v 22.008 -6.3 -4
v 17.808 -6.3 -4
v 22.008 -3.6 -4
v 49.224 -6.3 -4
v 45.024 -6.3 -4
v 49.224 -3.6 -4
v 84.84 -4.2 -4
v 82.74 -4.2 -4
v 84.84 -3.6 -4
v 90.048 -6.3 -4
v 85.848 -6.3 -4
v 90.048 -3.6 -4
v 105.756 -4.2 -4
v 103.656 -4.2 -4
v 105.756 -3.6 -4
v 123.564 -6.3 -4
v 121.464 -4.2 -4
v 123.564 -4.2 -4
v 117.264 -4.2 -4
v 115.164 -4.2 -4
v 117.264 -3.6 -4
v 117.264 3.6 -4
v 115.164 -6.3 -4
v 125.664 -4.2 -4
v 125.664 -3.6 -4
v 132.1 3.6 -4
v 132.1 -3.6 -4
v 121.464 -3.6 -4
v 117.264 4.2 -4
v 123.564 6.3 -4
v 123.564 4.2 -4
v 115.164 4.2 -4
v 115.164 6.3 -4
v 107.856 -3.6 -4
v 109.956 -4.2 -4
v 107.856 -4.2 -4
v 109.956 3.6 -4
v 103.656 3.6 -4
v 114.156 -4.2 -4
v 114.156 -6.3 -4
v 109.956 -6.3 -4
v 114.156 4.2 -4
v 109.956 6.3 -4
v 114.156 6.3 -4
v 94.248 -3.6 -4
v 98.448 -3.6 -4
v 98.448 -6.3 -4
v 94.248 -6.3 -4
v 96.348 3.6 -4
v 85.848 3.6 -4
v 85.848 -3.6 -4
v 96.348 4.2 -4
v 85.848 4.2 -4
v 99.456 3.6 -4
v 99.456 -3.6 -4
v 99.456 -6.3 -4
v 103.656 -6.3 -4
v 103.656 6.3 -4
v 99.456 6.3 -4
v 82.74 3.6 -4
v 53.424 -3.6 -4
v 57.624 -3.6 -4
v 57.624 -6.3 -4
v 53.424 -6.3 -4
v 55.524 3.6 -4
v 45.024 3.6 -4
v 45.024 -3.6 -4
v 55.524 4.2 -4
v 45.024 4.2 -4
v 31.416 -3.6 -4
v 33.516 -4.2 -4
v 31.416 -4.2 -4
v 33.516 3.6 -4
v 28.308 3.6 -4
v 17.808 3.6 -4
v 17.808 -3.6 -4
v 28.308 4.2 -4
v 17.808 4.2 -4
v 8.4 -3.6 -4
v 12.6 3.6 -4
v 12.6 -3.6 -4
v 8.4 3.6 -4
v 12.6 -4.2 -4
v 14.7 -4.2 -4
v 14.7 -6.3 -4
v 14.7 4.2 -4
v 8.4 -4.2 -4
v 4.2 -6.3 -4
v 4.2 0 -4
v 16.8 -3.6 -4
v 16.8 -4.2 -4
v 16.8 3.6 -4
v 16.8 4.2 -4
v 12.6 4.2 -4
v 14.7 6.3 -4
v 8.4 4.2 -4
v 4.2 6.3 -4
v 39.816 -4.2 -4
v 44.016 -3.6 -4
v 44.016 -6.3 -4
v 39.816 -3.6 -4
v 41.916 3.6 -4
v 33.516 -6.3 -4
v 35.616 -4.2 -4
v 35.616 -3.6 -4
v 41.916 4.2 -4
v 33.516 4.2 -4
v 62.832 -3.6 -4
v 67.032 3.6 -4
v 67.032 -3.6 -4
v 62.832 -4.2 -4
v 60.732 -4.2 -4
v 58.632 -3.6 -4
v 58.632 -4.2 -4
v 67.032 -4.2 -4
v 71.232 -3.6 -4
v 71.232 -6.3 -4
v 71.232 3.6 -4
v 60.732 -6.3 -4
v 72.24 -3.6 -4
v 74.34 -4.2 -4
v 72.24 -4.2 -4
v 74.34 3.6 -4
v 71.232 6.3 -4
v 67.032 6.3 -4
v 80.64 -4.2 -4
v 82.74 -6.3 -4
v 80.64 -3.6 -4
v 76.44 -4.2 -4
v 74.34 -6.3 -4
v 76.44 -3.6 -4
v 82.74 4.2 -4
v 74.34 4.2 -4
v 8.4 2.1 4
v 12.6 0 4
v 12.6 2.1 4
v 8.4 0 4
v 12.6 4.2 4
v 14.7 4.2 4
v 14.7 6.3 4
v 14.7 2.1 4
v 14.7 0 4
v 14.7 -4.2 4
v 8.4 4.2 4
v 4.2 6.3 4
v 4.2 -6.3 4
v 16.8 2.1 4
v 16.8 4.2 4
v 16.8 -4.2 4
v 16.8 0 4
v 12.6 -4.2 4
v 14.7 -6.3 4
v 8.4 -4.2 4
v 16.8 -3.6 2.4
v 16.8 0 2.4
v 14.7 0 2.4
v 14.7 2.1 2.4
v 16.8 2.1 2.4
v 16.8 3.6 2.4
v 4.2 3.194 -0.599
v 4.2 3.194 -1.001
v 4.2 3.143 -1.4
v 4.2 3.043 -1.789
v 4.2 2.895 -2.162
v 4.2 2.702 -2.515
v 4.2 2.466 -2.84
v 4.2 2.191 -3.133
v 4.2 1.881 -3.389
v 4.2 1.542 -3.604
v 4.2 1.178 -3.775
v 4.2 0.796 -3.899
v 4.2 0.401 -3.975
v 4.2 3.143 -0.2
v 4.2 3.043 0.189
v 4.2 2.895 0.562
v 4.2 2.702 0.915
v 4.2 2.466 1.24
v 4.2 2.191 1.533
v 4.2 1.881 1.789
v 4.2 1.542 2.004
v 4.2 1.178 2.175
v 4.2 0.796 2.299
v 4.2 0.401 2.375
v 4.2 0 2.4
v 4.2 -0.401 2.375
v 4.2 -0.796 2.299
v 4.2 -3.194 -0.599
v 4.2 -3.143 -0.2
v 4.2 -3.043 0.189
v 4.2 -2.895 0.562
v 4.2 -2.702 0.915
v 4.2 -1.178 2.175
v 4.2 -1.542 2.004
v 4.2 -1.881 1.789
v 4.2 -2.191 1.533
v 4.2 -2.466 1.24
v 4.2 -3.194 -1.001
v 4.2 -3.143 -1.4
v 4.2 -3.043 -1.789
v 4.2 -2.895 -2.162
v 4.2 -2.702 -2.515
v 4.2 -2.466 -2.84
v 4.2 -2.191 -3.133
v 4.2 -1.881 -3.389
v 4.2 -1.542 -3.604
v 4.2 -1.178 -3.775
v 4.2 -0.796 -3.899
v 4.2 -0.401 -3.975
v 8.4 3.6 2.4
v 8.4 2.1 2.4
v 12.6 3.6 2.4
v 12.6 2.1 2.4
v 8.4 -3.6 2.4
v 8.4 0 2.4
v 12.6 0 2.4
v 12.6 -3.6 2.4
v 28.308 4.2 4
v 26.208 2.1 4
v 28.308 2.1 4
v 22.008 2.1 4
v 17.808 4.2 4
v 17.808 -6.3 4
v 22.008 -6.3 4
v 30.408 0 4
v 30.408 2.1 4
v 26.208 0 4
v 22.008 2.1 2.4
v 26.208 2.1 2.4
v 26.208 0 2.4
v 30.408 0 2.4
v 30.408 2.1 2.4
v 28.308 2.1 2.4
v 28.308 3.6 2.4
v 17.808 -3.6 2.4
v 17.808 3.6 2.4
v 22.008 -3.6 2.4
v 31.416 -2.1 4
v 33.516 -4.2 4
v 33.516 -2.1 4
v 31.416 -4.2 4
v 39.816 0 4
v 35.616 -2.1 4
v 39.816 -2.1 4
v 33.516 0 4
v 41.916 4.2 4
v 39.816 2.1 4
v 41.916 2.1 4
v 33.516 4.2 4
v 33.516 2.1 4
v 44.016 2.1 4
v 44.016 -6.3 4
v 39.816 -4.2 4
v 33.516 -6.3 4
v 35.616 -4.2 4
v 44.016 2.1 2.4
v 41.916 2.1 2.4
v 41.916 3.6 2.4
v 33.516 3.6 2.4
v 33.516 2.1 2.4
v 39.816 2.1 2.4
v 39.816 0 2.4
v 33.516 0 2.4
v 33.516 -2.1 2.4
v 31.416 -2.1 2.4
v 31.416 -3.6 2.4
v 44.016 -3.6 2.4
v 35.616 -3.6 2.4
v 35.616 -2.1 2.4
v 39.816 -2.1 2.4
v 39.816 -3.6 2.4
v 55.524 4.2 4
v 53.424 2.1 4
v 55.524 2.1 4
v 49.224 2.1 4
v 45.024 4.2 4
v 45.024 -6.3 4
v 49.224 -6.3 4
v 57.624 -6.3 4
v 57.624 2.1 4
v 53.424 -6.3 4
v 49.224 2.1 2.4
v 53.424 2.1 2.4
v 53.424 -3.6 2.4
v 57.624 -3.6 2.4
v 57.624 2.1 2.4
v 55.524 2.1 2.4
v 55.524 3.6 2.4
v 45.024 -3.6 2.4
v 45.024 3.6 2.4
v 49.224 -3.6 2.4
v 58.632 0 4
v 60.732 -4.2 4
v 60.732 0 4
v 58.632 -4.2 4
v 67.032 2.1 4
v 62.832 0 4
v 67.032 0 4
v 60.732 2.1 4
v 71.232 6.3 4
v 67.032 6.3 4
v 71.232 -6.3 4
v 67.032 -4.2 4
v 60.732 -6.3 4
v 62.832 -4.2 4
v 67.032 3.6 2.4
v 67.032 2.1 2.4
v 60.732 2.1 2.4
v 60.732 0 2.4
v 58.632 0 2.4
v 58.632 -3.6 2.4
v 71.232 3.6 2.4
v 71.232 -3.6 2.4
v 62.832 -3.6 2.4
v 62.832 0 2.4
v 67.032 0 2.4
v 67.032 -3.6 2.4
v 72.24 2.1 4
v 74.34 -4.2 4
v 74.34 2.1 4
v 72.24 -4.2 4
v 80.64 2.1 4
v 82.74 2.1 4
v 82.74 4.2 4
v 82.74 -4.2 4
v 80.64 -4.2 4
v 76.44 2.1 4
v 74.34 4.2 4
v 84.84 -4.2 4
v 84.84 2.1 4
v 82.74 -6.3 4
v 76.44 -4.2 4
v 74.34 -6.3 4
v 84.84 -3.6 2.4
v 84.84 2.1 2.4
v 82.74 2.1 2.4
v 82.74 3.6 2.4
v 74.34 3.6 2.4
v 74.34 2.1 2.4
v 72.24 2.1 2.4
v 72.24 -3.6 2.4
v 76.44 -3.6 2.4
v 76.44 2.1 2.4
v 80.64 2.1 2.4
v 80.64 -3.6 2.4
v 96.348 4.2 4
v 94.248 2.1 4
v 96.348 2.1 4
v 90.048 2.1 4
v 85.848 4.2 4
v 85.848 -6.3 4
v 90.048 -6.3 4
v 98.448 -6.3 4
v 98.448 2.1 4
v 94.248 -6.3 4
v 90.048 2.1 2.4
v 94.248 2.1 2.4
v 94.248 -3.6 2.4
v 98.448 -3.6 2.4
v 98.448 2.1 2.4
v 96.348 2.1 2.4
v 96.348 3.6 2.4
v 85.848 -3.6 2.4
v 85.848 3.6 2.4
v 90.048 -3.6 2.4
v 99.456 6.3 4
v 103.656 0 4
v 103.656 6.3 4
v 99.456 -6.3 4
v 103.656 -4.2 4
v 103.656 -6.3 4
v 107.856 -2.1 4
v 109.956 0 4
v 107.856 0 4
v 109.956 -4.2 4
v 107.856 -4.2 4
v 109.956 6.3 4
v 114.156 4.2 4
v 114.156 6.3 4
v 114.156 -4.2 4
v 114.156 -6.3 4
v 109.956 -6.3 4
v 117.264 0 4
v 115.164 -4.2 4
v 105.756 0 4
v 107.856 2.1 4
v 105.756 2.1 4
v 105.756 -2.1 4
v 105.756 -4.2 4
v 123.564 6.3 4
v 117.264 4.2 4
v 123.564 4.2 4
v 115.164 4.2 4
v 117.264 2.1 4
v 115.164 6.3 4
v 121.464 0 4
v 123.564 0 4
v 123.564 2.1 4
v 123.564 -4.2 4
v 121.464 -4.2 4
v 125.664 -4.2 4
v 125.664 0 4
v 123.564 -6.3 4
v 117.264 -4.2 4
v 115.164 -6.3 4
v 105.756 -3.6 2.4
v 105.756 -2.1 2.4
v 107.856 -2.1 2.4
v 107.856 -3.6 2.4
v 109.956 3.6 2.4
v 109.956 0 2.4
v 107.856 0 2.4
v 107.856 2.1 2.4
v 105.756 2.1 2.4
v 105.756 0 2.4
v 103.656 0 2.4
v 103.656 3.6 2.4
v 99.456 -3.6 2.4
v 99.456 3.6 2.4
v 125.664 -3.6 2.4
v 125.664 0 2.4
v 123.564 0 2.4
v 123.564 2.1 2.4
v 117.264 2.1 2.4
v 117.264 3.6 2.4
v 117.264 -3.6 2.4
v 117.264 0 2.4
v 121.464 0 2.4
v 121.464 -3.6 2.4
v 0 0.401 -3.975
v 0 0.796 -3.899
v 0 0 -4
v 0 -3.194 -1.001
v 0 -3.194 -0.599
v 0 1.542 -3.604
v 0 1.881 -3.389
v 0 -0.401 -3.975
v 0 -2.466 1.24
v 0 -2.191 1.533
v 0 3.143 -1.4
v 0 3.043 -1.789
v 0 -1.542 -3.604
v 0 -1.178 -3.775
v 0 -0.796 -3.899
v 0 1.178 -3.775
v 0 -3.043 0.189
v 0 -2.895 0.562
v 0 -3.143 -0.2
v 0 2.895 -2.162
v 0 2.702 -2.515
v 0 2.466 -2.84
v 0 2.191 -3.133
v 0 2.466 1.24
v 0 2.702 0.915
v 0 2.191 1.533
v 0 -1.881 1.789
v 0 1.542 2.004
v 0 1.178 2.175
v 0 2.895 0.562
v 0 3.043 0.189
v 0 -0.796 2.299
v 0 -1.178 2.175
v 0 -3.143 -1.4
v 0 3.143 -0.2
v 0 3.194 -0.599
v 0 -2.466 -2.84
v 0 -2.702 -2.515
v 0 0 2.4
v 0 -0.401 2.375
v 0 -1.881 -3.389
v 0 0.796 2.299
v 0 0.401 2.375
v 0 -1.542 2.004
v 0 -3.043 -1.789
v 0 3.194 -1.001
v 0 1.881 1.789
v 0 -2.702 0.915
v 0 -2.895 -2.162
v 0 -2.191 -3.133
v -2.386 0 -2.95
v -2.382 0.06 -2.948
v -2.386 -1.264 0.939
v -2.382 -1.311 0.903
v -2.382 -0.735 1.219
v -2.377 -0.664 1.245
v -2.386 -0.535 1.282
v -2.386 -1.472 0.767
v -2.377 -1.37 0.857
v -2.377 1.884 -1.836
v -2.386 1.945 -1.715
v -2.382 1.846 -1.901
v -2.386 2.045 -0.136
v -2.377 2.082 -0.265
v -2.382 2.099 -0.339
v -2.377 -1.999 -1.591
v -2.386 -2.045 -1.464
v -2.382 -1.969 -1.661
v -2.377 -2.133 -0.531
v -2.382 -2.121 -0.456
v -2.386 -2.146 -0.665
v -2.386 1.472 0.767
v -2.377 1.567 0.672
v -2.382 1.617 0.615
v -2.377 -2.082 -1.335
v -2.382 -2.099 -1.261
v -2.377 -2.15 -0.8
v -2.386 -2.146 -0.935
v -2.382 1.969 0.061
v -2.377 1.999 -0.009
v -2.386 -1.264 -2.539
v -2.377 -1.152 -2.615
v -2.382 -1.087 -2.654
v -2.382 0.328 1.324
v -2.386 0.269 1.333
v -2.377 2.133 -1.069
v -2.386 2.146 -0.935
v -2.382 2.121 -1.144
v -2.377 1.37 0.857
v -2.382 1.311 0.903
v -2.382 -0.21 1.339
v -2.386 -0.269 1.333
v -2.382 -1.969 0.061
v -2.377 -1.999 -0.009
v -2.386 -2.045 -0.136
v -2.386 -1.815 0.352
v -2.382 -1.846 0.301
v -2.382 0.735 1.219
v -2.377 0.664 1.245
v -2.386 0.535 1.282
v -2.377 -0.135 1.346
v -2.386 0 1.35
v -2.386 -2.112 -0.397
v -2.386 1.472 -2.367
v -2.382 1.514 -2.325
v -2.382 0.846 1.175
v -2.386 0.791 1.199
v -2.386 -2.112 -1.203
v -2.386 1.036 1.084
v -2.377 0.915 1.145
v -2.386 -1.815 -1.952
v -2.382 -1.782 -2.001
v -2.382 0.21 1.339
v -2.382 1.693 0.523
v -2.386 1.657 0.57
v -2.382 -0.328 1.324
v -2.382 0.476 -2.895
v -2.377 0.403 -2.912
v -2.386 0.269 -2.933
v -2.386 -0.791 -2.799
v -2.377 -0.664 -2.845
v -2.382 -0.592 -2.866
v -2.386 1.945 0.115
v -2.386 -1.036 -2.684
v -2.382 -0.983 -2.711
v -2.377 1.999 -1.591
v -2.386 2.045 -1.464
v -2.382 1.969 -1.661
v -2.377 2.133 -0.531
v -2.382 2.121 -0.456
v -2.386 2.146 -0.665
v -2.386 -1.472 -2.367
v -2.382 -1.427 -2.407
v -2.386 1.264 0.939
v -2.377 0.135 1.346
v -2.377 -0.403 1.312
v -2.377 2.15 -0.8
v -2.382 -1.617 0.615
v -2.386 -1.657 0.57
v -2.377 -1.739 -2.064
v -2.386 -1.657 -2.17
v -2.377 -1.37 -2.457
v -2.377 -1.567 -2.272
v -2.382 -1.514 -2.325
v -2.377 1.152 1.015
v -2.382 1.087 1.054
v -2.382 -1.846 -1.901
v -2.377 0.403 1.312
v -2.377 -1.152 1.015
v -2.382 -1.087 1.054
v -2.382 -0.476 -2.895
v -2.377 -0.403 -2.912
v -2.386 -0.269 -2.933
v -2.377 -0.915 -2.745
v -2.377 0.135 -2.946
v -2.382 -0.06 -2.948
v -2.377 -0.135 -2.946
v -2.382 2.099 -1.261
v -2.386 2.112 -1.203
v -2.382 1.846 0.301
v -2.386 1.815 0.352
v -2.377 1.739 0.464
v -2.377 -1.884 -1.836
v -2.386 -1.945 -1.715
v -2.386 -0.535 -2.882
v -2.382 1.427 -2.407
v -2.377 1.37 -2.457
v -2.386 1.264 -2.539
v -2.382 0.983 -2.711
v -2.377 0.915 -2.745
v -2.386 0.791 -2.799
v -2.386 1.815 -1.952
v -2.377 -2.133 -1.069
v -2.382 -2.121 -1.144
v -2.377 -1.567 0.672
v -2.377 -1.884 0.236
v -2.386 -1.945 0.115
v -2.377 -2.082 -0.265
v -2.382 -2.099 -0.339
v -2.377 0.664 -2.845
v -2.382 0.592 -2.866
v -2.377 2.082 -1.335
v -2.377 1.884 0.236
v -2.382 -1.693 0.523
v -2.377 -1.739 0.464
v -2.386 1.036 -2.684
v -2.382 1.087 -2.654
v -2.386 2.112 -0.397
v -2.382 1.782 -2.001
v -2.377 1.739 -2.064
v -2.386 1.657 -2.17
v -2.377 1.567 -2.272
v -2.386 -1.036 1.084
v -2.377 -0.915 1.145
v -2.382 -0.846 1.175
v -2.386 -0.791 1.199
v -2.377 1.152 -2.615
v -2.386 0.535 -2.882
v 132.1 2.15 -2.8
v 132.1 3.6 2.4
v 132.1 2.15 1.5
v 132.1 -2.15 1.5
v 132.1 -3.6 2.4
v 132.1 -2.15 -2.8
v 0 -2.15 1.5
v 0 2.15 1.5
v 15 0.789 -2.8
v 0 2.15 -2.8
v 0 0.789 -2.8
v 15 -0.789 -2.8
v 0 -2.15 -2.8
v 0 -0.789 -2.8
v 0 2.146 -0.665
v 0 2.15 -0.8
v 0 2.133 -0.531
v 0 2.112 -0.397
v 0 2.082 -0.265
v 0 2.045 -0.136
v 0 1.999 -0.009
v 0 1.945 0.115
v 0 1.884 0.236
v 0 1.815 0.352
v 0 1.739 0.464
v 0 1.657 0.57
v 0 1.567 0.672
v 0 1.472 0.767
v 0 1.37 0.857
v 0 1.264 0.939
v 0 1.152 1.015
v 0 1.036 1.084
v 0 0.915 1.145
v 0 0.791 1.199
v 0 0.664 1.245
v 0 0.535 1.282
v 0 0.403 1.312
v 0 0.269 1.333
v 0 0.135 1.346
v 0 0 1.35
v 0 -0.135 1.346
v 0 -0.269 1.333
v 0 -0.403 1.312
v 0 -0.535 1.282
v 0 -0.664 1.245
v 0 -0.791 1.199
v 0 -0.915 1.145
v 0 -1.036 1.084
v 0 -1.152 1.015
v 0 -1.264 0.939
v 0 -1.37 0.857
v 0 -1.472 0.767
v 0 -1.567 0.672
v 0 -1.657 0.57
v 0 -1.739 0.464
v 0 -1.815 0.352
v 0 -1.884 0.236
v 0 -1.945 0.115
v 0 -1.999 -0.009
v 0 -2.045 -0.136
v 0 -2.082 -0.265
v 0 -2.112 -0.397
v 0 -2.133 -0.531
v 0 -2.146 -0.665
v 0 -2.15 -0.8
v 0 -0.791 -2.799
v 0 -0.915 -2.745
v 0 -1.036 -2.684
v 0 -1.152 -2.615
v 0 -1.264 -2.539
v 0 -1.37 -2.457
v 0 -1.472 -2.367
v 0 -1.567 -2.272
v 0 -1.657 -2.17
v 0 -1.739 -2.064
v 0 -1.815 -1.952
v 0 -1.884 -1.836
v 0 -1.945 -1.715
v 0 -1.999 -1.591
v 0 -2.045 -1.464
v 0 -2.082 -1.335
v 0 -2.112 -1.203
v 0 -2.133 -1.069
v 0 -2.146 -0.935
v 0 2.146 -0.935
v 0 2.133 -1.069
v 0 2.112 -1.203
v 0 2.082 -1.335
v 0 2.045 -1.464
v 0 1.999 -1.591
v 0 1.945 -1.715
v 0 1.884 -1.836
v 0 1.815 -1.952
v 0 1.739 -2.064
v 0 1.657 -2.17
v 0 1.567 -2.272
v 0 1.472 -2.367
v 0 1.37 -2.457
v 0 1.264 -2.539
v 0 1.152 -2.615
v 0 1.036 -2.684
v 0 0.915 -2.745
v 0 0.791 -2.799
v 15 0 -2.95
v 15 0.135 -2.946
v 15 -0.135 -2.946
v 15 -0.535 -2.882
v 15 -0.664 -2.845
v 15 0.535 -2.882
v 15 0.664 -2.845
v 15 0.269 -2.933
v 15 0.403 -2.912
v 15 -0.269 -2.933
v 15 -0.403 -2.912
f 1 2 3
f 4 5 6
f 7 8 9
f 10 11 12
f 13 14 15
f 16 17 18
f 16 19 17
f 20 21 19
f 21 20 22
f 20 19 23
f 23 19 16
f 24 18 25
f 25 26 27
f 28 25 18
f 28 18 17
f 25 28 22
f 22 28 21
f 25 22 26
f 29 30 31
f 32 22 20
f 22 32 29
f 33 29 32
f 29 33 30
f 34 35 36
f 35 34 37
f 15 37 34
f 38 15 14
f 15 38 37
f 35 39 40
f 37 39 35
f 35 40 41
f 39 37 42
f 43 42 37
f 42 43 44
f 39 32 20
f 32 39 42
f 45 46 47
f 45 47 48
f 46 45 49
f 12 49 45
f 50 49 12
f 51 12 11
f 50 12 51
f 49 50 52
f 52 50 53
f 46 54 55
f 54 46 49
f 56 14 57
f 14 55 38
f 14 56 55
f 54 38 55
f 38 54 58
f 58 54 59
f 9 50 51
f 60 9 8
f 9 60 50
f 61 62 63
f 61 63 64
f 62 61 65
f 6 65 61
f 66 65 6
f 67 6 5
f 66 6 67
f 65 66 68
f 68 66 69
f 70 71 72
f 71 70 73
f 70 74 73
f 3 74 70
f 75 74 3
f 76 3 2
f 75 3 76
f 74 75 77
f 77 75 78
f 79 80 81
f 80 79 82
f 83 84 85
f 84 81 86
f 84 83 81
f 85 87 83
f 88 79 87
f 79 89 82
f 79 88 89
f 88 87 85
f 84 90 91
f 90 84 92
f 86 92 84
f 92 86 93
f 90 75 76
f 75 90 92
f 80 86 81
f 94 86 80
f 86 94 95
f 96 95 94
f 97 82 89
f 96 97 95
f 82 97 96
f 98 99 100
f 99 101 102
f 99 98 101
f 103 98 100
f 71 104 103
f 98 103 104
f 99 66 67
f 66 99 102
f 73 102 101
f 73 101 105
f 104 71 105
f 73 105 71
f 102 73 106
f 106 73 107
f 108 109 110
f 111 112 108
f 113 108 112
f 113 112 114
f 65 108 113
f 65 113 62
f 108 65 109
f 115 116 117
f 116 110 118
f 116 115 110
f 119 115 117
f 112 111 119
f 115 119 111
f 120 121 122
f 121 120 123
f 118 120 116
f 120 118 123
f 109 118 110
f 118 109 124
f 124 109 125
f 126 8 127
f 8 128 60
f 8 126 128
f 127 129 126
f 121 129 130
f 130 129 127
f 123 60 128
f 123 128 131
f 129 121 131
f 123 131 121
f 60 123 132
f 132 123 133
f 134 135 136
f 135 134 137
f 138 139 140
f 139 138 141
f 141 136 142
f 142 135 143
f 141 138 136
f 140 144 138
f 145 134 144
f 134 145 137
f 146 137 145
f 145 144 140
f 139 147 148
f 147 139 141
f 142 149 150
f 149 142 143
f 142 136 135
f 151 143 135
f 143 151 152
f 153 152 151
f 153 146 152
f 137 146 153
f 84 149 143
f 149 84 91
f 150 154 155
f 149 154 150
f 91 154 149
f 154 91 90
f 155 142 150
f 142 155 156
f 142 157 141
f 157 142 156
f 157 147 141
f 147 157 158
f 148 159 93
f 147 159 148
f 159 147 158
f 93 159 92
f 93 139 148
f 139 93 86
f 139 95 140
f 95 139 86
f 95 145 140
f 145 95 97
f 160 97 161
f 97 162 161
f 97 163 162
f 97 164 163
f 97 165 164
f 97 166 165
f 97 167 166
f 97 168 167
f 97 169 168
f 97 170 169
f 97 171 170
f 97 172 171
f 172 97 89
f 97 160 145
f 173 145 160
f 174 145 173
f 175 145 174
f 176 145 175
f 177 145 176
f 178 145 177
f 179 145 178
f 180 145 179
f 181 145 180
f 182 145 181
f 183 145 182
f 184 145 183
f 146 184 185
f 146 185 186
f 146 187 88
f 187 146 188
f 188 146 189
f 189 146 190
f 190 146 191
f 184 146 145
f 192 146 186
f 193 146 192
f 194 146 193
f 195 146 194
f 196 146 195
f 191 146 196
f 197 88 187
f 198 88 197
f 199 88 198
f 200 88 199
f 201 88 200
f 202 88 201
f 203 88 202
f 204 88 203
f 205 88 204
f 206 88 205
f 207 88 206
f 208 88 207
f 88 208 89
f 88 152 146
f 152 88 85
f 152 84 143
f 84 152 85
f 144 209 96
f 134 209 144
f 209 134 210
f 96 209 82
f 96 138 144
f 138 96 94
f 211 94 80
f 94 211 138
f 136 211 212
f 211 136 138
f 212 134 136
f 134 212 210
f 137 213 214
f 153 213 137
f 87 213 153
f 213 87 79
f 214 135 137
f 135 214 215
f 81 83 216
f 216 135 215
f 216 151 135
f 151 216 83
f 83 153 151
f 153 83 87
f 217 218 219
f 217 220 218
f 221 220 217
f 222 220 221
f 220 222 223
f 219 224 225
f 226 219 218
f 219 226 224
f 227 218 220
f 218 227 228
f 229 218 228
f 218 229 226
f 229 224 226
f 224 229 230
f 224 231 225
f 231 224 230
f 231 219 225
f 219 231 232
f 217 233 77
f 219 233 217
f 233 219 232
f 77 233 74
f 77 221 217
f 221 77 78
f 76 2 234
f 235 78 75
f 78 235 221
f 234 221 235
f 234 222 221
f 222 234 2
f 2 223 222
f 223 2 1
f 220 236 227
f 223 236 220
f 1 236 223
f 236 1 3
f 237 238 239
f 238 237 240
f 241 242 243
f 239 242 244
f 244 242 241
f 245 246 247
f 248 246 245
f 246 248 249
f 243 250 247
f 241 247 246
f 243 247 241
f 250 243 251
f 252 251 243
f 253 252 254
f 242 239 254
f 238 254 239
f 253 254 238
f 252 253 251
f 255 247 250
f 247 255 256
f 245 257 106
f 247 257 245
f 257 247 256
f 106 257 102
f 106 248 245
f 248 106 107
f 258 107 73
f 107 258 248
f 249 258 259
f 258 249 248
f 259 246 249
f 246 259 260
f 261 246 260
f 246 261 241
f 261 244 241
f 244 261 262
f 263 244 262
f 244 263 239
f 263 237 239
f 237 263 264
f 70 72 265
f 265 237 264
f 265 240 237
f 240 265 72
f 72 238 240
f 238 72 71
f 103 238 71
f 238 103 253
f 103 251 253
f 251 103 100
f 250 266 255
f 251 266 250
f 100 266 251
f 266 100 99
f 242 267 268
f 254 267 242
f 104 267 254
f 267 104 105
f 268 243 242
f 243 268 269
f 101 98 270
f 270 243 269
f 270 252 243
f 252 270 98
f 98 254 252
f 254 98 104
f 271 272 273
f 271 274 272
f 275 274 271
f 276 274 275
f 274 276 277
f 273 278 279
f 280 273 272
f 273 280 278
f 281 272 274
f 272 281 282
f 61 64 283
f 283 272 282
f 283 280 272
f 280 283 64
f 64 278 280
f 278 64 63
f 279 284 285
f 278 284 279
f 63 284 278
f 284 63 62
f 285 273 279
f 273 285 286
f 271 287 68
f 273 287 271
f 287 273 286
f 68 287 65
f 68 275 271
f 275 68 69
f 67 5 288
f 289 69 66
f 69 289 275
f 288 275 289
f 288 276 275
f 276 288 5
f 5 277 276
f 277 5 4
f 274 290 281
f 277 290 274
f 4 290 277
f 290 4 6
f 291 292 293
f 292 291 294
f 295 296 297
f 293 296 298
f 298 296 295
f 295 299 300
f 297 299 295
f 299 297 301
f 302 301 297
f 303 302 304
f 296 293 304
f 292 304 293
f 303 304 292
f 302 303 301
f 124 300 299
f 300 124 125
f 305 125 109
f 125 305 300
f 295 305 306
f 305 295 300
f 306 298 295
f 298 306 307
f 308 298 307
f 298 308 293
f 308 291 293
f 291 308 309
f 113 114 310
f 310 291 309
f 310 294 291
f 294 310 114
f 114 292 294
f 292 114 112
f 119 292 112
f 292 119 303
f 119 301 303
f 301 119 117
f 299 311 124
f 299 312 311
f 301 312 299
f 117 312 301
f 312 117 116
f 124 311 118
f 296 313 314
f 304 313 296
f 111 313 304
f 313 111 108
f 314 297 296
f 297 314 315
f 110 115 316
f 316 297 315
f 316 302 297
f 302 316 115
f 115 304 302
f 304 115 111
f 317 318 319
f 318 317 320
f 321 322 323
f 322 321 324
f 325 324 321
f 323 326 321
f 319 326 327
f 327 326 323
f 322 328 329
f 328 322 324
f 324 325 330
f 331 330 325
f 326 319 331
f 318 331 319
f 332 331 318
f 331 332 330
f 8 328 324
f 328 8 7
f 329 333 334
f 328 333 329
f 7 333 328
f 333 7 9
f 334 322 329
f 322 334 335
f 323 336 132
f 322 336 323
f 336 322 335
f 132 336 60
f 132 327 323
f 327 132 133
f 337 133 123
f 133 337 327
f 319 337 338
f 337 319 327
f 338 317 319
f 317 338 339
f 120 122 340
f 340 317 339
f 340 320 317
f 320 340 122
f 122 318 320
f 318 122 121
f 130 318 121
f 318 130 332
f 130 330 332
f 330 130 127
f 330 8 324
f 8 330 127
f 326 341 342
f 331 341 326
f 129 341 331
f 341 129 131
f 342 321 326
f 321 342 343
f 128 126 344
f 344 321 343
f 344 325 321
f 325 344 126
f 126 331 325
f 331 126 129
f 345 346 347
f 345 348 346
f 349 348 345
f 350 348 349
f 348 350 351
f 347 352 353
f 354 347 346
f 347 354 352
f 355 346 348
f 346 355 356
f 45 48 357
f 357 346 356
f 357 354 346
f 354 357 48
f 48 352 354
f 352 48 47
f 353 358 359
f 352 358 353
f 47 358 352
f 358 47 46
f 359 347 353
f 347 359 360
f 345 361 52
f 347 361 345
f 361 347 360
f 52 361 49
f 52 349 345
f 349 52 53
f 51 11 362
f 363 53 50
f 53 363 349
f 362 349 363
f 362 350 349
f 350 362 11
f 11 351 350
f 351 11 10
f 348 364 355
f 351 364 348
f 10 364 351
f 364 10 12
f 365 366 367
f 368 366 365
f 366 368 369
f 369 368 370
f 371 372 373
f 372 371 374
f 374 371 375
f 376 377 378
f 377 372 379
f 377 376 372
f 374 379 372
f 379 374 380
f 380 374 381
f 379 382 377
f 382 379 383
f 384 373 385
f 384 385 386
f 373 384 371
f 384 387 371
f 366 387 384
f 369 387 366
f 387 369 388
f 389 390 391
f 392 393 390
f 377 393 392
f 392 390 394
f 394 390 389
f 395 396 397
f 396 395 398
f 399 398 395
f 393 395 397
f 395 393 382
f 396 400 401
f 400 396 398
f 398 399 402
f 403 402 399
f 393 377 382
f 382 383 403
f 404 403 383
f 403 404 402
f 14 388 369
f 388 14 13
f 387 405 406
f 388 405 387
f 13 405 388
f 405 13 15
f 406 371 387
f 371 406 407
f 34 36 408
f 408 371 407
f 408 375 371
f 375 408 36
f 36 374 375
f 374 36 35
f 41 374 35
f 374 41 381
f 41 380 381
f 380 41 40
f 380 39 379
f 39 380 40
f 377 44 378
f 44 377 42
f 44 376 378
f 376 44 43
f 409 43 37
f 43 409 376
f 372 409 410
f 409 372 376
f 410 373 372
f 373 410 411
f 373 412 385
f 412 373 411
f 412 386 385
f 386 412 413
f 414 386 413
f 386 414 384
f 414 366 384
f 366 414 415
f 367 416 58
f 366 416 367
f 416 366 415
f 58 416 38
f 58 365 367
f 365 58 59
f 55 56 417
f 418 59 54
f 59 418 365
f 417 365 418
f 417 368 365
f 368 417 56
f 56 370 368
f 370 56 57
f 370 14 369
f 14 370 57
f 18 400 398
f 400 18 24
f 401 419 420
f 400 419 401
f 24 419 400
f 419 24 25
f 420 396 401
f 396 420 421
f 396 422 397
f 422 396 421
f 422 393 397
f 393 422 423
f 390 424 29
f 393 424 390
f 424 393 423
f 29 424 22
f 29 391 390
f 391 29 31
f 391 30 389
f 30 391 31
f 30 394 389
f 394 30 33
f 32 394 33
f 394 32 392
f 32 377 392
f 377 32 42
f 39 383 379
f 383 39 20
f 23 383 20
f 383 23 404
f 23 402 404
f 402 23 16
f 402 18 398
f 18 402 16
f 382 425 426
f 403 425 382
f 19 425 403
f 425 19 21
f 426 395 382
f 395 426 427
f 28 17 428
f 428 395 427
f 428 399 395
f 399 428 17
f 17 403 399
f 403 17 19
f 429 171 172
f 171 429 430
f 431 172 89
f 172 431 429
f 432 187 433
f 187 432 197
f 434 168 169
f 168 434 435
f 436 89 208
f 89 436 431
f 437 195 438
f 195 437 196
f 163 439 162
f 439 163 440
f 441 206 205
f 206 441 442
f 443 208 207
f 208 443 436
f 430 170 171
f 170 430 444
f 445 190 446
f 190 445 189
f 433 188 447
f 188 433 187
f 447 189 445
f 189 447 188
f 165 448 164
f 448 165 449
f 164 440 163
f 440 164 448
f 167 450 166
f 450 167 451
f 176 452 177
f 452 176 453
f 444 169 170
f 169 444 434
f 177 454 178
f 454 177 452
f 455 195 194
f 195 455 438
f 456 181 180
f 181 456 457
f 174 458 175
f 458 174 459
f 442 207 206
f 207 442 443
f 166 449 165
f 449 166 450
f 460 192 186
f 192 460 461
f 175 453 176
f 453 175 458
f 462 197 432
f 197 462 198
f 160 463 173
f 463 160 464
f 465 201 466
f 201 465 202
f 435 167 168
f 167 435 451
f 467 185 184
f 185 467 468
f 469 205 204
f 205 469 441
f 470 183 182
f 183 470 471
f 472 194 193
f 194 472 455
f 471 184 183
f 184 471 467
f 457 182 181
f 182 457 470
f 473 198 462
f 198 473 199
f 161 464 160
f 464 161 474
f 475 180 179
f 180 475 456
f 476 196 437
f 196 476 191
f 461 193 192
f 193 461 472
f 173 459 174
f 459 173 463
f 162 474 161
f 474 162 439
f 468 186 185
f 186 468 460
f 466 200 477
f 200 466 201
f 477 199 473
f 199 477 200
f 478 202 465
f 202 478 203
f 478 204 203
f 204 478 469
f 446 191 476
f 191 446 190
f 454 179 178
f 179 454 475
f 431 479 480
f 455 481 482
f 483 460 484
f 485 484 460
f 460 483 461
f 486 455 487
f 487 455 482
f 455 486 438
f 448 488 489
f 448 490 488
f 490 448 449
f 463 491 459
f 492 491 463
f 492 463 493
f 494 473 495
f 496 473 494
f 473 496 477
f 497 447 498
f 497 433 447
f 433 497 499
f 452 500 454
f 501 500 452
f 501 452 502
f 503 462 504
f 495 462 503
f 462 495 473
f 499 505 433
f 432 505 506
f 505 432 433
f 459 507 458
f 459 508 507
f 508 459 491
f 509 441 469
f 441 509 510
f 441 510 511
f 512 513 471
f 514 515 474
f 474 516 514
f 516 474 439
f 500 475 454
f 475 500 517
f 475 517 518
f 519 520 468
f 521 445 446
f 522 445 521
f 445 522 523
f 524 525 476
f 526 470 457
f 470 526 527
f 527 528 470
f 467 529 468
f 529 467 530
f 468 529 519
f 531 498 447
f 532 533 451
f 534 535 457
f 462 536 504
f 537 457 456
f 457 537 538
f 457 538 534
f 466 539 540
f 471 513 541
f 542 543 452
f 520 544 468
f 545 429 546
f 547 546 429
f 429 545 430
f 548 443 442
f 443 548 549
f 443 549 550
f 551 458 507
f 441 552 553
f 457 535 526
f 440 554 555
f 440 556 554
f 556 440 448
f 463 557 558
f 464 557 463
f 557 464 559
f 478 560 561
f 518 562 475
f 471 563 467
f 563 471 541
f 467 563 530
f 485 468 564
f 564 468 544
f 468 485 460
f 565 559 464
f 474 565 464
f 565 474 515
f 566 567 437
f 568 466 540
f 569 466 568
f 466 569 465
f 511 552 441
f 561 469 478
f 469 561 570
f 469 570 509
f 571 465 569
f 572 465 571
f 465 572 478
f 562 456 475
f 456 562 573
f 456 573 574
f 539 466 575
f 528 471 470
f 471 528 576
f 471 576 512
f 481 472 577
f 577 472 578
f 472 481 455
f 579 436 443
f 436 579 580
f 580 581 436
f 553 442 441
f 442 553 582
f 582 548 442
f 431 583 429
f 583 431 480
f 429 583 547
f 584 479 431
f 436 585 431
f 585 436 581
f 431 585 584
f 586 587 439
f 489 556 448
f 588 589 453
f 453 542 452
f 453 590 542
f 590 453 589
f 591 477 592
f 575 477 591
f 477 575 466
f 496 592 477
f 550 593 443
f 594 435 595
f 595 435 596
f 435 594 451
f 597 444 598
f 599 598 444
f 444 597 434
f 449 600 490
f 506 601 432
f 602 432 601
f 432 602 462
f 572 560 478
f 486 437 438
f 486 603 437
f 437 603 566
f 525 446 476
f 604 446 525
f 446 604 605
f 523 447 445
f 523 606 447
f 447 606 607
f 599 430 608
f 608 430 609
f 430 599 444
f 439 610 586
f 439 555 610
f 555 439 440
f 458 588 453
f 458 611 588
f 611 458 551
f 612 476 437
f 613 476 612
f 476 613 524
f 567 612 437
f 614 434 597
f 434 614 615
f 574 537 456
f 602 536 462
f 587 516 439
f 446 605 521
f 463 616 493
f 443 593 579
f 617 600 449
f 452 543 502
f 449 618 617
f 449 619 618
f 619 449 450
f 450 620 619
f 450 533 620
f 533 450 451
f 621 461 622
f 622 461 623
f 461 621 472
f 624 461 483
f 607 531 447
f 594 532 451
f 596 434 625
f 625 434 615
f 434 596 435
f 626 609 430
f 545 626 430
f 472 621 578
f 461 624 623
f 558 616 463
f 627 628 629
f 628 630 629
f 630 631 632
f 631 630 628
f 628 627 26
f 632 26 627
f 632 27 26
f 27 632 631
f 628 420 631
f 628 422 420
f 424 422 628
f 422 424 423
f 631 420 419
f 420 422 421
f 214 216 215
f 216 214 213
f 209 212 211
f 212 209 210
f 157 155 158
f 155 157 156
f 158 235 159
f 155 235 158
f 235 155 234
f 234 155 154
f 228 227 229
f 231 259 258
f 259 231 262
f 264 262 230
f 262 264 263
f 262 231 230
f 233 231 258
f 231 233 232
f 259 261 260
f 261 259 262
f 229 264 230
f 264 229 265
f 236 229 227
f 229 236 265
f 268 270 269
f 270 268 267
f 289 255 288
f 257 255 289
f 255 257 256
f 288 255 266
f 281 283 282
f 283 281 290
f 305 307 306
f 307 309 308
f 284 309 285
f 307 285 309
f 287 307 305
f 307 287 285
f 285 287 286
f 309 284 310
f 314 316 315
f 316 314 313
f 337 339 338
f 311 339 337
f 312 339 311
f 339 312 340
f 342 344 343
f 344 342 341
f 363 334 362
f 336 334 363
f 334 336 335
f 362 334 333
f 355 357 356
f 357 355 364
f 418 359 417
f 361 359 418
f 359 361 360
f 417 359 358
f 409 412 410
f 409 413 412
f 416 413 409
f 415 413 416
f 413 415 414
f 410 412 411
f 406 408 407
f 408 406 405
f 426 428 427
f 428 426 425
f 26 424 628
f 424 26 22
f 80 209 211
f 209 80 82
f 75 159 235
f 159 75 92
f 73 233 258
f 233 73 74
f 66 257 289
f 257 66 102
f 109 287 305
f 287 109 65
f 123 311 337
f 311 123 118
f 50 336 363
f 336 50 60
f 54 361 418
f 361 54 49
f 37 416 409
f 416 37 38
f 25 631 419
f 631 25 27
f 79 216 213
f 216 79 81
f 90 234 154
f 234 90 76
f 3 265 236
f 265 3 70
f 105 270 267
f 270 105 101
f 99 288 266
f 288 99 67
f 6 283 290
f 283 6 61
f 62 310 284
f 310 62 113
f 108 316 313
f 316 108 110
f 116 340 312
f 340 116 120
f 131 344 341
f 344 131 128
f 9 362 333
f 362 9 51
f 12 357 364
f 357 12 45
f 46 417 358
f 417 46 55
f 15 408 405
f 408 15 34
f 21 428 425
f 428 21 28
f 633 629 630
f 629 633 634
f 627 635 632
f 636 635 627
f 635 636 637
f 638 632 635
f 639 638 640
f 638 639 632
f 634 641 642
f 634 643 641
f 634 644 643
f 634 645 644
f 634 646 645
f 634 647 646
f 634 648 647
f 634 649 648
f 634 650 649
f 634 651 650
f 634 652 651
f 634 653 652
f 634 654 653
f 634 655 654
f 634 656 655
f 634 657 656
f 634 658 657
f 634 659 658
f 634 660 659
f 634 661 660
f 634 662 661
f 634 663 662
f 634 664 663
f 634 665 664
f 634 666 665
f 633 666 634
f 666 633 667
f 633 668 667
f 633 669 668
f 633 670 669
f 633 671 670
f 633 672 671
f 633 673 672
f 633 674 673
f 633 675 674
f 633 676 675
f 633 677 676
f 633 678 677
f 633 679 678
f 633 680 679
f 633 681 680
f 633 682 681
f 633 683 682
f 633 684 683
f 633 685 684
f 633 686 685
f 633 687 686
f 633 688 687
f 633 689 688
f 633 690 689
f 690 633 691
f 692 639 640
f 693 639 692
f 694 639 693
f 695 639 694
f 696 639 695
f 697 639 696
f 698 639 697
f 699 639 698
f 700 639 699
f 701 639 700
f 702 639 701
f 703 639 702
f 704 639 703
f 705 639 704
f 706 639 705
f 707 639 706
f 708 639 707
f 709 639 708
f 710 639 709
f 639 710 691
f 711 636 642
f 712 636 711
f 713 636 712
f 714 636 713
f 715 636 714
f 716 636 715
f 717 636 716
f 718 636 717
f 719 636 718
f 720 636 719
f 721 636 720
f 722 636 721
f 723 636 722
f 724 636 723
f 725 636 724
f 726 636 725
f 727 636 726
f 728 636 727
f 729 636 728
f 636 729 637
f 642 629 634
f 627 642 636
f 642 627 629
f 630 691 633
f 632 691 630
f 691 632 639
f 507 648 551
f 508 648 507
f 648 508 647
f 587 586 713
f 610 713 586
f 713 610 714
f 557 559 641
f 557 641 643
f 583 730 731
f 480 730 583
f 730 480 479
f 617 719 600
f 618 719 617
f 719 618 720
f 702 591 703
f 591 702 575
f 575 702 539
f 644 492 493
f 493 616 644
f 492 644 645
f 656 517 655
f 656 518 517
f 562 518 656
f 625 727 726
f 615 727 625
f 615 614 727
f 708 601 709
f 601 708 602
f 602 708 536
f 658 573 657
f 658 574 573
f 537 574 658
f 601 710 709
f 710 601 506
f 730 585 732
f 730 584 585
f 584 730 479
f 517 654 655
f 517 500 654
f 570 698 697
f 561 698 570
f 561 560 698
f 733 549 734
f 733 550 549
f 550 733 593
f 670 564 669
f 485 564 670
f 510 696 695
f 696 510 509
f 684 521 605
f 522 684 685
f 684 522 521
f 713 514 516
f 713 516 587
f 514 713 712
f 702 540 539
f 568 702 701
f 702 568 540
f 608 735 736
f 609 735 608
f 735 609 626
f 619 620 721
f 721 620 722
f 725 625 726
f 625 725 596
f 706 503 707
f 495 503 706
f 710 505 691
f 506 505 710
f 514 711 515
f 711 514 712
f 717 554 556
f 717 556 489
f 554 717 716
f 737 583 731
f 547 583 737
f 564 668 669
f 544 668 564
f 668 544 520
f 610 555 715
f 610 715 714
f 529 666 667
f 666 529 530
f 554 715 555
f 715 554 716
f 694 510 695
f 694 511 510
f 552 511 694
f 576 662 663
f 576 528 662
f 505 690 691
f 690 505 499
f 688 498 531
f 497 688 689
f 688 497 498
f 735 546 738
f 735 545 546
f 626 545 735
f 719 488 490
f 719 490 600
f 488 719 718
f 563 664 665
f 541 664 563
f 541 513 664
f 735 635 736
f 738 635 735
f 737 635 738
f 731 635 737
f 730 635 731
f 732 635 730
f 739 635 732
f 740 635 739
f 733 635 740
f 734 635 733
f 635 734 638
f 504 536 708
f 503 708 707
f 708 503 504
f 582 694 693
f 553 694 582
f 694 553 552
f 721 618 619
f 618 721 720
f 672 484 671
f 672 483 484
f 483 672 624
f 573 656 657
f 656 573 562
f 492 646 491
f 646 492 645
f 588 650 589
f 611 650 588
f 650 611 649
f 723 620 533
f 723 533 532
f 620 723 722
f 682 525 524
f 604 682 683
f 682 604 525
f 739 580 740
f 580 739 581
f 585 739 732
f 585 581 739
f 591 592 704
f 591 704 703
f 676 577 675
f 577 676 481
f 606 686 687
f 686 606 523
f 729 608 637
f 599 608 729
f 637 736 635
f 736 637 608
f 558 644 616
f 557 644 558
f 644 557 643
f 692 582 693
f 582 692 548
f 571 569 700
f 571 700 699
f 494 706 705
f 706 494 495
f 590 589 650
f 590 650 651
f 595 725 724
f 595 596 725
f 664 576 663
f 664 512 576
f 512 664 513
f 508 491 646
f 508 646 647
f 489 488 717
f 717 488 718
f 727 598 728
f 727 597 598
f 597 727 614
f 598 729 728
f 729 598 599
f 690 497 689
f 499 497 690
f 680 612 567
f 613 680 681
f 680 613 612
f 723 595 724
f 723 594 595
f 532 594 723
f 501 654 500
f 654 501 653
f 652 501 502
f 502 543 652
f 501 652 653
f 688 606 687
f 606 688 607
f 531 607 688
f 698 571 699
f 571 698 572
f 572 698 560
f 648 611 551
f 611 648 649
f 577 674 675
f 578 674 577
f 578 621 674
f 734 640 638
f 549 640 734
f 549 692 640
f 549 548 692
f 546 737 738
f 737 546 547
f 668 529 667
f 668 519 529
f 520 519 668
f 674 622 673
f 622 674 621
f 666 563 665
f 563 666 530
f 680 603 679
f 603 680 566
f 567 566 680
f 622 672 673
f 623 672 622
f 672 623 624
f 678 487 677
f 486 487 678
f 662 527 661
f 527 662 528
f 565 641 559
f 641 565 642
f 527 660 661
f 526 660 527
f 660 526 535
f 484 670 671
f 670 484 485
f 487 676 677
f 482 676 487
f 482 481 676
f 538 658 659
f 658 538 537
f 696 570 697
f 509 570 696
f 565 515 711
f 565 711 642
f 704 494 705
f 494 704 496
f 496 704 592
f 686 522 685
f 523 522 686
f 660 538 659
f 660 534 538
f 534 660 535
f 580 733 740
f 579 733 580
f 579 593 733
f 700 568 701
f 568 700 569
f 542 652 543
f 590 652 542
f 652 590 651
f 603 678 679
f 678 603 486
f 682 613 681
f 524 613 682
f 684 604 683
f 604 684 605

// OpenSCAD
use <MCAD/fonts.scad>

// Word to display on the pen
word = "BrandonW6";

// Scale multipler for font size
font_scale = 2.1	;

// Character Spacing (for some reason this value is buggy using the customizer)
font_spacing = 0.81; 

// The diameter of end hole
pen_inner_diameter = 4.3 *1;
pen_inner_radius = pen_inner_diameter / 2;

// length of the entire pen
pen_length = 130; //

// Overal thickness of the pen
pen_thickness = 8*1;


/////////////////////////////////////////
//////////////////////////////////



module penword()
{

thisFont=8bit_polyfont();
x_shift=thisFont[0][0] * font_spacing;
y_shift=thisFont[0][1];

	theseIndicies=search(word,thisFont[2],1,1);
	wordlength = (len(theseIndicies))* x_shift;
	
	difference() {

		union() {

// Create the Text //
			scale([font_scale,font_scale,1]){
			for( j=[0:(len(theseIndicies)-1)] ) 
				translate([ j*x_shift + 1, -y_shift/2 ,-pen_thickness/2]) 
				{
					linear_extrude(height=pen_thickness) polygon(points=thisFont[2][theseIndicies[j]][6][0],paths=thisFont[2][theseIndicies[j]][6][1]);
				}
			}
			
// Main body
			translate([1*font_scale+3	,-y_shift*.45,-pen_thickness/2]) cube([pen_length - 3,y_shift * 0.9,pen_thickness * 0.8]);

// Pen Tip
			rotate(a=[0,90,0]) 
				{
					translate([pen_thickness*0.1,0,0	])	cylinder(h = 5, r = pen_thickness*.4, $fn=50);
					translate([pen_thickness*0.1,0,-5	])	cylinder(h = 5, r1 = 1, r2 = pen_thickness*.4, $fn=50);
				}			
		}
// Cut outs
			translate([0,-pen_inner_diameter/2,-pen_thickness/2+pen_thickness*.15]) cube([pen_length + 20,pen_inner_diameter,pen_inner_diameter]);
			rotate(a=[0,90,0])translate([pen_thickness*.1,0,-15])	cylinder(h = 30, r = pen_inner_radius, $fn=100);
	}
}




penword();
